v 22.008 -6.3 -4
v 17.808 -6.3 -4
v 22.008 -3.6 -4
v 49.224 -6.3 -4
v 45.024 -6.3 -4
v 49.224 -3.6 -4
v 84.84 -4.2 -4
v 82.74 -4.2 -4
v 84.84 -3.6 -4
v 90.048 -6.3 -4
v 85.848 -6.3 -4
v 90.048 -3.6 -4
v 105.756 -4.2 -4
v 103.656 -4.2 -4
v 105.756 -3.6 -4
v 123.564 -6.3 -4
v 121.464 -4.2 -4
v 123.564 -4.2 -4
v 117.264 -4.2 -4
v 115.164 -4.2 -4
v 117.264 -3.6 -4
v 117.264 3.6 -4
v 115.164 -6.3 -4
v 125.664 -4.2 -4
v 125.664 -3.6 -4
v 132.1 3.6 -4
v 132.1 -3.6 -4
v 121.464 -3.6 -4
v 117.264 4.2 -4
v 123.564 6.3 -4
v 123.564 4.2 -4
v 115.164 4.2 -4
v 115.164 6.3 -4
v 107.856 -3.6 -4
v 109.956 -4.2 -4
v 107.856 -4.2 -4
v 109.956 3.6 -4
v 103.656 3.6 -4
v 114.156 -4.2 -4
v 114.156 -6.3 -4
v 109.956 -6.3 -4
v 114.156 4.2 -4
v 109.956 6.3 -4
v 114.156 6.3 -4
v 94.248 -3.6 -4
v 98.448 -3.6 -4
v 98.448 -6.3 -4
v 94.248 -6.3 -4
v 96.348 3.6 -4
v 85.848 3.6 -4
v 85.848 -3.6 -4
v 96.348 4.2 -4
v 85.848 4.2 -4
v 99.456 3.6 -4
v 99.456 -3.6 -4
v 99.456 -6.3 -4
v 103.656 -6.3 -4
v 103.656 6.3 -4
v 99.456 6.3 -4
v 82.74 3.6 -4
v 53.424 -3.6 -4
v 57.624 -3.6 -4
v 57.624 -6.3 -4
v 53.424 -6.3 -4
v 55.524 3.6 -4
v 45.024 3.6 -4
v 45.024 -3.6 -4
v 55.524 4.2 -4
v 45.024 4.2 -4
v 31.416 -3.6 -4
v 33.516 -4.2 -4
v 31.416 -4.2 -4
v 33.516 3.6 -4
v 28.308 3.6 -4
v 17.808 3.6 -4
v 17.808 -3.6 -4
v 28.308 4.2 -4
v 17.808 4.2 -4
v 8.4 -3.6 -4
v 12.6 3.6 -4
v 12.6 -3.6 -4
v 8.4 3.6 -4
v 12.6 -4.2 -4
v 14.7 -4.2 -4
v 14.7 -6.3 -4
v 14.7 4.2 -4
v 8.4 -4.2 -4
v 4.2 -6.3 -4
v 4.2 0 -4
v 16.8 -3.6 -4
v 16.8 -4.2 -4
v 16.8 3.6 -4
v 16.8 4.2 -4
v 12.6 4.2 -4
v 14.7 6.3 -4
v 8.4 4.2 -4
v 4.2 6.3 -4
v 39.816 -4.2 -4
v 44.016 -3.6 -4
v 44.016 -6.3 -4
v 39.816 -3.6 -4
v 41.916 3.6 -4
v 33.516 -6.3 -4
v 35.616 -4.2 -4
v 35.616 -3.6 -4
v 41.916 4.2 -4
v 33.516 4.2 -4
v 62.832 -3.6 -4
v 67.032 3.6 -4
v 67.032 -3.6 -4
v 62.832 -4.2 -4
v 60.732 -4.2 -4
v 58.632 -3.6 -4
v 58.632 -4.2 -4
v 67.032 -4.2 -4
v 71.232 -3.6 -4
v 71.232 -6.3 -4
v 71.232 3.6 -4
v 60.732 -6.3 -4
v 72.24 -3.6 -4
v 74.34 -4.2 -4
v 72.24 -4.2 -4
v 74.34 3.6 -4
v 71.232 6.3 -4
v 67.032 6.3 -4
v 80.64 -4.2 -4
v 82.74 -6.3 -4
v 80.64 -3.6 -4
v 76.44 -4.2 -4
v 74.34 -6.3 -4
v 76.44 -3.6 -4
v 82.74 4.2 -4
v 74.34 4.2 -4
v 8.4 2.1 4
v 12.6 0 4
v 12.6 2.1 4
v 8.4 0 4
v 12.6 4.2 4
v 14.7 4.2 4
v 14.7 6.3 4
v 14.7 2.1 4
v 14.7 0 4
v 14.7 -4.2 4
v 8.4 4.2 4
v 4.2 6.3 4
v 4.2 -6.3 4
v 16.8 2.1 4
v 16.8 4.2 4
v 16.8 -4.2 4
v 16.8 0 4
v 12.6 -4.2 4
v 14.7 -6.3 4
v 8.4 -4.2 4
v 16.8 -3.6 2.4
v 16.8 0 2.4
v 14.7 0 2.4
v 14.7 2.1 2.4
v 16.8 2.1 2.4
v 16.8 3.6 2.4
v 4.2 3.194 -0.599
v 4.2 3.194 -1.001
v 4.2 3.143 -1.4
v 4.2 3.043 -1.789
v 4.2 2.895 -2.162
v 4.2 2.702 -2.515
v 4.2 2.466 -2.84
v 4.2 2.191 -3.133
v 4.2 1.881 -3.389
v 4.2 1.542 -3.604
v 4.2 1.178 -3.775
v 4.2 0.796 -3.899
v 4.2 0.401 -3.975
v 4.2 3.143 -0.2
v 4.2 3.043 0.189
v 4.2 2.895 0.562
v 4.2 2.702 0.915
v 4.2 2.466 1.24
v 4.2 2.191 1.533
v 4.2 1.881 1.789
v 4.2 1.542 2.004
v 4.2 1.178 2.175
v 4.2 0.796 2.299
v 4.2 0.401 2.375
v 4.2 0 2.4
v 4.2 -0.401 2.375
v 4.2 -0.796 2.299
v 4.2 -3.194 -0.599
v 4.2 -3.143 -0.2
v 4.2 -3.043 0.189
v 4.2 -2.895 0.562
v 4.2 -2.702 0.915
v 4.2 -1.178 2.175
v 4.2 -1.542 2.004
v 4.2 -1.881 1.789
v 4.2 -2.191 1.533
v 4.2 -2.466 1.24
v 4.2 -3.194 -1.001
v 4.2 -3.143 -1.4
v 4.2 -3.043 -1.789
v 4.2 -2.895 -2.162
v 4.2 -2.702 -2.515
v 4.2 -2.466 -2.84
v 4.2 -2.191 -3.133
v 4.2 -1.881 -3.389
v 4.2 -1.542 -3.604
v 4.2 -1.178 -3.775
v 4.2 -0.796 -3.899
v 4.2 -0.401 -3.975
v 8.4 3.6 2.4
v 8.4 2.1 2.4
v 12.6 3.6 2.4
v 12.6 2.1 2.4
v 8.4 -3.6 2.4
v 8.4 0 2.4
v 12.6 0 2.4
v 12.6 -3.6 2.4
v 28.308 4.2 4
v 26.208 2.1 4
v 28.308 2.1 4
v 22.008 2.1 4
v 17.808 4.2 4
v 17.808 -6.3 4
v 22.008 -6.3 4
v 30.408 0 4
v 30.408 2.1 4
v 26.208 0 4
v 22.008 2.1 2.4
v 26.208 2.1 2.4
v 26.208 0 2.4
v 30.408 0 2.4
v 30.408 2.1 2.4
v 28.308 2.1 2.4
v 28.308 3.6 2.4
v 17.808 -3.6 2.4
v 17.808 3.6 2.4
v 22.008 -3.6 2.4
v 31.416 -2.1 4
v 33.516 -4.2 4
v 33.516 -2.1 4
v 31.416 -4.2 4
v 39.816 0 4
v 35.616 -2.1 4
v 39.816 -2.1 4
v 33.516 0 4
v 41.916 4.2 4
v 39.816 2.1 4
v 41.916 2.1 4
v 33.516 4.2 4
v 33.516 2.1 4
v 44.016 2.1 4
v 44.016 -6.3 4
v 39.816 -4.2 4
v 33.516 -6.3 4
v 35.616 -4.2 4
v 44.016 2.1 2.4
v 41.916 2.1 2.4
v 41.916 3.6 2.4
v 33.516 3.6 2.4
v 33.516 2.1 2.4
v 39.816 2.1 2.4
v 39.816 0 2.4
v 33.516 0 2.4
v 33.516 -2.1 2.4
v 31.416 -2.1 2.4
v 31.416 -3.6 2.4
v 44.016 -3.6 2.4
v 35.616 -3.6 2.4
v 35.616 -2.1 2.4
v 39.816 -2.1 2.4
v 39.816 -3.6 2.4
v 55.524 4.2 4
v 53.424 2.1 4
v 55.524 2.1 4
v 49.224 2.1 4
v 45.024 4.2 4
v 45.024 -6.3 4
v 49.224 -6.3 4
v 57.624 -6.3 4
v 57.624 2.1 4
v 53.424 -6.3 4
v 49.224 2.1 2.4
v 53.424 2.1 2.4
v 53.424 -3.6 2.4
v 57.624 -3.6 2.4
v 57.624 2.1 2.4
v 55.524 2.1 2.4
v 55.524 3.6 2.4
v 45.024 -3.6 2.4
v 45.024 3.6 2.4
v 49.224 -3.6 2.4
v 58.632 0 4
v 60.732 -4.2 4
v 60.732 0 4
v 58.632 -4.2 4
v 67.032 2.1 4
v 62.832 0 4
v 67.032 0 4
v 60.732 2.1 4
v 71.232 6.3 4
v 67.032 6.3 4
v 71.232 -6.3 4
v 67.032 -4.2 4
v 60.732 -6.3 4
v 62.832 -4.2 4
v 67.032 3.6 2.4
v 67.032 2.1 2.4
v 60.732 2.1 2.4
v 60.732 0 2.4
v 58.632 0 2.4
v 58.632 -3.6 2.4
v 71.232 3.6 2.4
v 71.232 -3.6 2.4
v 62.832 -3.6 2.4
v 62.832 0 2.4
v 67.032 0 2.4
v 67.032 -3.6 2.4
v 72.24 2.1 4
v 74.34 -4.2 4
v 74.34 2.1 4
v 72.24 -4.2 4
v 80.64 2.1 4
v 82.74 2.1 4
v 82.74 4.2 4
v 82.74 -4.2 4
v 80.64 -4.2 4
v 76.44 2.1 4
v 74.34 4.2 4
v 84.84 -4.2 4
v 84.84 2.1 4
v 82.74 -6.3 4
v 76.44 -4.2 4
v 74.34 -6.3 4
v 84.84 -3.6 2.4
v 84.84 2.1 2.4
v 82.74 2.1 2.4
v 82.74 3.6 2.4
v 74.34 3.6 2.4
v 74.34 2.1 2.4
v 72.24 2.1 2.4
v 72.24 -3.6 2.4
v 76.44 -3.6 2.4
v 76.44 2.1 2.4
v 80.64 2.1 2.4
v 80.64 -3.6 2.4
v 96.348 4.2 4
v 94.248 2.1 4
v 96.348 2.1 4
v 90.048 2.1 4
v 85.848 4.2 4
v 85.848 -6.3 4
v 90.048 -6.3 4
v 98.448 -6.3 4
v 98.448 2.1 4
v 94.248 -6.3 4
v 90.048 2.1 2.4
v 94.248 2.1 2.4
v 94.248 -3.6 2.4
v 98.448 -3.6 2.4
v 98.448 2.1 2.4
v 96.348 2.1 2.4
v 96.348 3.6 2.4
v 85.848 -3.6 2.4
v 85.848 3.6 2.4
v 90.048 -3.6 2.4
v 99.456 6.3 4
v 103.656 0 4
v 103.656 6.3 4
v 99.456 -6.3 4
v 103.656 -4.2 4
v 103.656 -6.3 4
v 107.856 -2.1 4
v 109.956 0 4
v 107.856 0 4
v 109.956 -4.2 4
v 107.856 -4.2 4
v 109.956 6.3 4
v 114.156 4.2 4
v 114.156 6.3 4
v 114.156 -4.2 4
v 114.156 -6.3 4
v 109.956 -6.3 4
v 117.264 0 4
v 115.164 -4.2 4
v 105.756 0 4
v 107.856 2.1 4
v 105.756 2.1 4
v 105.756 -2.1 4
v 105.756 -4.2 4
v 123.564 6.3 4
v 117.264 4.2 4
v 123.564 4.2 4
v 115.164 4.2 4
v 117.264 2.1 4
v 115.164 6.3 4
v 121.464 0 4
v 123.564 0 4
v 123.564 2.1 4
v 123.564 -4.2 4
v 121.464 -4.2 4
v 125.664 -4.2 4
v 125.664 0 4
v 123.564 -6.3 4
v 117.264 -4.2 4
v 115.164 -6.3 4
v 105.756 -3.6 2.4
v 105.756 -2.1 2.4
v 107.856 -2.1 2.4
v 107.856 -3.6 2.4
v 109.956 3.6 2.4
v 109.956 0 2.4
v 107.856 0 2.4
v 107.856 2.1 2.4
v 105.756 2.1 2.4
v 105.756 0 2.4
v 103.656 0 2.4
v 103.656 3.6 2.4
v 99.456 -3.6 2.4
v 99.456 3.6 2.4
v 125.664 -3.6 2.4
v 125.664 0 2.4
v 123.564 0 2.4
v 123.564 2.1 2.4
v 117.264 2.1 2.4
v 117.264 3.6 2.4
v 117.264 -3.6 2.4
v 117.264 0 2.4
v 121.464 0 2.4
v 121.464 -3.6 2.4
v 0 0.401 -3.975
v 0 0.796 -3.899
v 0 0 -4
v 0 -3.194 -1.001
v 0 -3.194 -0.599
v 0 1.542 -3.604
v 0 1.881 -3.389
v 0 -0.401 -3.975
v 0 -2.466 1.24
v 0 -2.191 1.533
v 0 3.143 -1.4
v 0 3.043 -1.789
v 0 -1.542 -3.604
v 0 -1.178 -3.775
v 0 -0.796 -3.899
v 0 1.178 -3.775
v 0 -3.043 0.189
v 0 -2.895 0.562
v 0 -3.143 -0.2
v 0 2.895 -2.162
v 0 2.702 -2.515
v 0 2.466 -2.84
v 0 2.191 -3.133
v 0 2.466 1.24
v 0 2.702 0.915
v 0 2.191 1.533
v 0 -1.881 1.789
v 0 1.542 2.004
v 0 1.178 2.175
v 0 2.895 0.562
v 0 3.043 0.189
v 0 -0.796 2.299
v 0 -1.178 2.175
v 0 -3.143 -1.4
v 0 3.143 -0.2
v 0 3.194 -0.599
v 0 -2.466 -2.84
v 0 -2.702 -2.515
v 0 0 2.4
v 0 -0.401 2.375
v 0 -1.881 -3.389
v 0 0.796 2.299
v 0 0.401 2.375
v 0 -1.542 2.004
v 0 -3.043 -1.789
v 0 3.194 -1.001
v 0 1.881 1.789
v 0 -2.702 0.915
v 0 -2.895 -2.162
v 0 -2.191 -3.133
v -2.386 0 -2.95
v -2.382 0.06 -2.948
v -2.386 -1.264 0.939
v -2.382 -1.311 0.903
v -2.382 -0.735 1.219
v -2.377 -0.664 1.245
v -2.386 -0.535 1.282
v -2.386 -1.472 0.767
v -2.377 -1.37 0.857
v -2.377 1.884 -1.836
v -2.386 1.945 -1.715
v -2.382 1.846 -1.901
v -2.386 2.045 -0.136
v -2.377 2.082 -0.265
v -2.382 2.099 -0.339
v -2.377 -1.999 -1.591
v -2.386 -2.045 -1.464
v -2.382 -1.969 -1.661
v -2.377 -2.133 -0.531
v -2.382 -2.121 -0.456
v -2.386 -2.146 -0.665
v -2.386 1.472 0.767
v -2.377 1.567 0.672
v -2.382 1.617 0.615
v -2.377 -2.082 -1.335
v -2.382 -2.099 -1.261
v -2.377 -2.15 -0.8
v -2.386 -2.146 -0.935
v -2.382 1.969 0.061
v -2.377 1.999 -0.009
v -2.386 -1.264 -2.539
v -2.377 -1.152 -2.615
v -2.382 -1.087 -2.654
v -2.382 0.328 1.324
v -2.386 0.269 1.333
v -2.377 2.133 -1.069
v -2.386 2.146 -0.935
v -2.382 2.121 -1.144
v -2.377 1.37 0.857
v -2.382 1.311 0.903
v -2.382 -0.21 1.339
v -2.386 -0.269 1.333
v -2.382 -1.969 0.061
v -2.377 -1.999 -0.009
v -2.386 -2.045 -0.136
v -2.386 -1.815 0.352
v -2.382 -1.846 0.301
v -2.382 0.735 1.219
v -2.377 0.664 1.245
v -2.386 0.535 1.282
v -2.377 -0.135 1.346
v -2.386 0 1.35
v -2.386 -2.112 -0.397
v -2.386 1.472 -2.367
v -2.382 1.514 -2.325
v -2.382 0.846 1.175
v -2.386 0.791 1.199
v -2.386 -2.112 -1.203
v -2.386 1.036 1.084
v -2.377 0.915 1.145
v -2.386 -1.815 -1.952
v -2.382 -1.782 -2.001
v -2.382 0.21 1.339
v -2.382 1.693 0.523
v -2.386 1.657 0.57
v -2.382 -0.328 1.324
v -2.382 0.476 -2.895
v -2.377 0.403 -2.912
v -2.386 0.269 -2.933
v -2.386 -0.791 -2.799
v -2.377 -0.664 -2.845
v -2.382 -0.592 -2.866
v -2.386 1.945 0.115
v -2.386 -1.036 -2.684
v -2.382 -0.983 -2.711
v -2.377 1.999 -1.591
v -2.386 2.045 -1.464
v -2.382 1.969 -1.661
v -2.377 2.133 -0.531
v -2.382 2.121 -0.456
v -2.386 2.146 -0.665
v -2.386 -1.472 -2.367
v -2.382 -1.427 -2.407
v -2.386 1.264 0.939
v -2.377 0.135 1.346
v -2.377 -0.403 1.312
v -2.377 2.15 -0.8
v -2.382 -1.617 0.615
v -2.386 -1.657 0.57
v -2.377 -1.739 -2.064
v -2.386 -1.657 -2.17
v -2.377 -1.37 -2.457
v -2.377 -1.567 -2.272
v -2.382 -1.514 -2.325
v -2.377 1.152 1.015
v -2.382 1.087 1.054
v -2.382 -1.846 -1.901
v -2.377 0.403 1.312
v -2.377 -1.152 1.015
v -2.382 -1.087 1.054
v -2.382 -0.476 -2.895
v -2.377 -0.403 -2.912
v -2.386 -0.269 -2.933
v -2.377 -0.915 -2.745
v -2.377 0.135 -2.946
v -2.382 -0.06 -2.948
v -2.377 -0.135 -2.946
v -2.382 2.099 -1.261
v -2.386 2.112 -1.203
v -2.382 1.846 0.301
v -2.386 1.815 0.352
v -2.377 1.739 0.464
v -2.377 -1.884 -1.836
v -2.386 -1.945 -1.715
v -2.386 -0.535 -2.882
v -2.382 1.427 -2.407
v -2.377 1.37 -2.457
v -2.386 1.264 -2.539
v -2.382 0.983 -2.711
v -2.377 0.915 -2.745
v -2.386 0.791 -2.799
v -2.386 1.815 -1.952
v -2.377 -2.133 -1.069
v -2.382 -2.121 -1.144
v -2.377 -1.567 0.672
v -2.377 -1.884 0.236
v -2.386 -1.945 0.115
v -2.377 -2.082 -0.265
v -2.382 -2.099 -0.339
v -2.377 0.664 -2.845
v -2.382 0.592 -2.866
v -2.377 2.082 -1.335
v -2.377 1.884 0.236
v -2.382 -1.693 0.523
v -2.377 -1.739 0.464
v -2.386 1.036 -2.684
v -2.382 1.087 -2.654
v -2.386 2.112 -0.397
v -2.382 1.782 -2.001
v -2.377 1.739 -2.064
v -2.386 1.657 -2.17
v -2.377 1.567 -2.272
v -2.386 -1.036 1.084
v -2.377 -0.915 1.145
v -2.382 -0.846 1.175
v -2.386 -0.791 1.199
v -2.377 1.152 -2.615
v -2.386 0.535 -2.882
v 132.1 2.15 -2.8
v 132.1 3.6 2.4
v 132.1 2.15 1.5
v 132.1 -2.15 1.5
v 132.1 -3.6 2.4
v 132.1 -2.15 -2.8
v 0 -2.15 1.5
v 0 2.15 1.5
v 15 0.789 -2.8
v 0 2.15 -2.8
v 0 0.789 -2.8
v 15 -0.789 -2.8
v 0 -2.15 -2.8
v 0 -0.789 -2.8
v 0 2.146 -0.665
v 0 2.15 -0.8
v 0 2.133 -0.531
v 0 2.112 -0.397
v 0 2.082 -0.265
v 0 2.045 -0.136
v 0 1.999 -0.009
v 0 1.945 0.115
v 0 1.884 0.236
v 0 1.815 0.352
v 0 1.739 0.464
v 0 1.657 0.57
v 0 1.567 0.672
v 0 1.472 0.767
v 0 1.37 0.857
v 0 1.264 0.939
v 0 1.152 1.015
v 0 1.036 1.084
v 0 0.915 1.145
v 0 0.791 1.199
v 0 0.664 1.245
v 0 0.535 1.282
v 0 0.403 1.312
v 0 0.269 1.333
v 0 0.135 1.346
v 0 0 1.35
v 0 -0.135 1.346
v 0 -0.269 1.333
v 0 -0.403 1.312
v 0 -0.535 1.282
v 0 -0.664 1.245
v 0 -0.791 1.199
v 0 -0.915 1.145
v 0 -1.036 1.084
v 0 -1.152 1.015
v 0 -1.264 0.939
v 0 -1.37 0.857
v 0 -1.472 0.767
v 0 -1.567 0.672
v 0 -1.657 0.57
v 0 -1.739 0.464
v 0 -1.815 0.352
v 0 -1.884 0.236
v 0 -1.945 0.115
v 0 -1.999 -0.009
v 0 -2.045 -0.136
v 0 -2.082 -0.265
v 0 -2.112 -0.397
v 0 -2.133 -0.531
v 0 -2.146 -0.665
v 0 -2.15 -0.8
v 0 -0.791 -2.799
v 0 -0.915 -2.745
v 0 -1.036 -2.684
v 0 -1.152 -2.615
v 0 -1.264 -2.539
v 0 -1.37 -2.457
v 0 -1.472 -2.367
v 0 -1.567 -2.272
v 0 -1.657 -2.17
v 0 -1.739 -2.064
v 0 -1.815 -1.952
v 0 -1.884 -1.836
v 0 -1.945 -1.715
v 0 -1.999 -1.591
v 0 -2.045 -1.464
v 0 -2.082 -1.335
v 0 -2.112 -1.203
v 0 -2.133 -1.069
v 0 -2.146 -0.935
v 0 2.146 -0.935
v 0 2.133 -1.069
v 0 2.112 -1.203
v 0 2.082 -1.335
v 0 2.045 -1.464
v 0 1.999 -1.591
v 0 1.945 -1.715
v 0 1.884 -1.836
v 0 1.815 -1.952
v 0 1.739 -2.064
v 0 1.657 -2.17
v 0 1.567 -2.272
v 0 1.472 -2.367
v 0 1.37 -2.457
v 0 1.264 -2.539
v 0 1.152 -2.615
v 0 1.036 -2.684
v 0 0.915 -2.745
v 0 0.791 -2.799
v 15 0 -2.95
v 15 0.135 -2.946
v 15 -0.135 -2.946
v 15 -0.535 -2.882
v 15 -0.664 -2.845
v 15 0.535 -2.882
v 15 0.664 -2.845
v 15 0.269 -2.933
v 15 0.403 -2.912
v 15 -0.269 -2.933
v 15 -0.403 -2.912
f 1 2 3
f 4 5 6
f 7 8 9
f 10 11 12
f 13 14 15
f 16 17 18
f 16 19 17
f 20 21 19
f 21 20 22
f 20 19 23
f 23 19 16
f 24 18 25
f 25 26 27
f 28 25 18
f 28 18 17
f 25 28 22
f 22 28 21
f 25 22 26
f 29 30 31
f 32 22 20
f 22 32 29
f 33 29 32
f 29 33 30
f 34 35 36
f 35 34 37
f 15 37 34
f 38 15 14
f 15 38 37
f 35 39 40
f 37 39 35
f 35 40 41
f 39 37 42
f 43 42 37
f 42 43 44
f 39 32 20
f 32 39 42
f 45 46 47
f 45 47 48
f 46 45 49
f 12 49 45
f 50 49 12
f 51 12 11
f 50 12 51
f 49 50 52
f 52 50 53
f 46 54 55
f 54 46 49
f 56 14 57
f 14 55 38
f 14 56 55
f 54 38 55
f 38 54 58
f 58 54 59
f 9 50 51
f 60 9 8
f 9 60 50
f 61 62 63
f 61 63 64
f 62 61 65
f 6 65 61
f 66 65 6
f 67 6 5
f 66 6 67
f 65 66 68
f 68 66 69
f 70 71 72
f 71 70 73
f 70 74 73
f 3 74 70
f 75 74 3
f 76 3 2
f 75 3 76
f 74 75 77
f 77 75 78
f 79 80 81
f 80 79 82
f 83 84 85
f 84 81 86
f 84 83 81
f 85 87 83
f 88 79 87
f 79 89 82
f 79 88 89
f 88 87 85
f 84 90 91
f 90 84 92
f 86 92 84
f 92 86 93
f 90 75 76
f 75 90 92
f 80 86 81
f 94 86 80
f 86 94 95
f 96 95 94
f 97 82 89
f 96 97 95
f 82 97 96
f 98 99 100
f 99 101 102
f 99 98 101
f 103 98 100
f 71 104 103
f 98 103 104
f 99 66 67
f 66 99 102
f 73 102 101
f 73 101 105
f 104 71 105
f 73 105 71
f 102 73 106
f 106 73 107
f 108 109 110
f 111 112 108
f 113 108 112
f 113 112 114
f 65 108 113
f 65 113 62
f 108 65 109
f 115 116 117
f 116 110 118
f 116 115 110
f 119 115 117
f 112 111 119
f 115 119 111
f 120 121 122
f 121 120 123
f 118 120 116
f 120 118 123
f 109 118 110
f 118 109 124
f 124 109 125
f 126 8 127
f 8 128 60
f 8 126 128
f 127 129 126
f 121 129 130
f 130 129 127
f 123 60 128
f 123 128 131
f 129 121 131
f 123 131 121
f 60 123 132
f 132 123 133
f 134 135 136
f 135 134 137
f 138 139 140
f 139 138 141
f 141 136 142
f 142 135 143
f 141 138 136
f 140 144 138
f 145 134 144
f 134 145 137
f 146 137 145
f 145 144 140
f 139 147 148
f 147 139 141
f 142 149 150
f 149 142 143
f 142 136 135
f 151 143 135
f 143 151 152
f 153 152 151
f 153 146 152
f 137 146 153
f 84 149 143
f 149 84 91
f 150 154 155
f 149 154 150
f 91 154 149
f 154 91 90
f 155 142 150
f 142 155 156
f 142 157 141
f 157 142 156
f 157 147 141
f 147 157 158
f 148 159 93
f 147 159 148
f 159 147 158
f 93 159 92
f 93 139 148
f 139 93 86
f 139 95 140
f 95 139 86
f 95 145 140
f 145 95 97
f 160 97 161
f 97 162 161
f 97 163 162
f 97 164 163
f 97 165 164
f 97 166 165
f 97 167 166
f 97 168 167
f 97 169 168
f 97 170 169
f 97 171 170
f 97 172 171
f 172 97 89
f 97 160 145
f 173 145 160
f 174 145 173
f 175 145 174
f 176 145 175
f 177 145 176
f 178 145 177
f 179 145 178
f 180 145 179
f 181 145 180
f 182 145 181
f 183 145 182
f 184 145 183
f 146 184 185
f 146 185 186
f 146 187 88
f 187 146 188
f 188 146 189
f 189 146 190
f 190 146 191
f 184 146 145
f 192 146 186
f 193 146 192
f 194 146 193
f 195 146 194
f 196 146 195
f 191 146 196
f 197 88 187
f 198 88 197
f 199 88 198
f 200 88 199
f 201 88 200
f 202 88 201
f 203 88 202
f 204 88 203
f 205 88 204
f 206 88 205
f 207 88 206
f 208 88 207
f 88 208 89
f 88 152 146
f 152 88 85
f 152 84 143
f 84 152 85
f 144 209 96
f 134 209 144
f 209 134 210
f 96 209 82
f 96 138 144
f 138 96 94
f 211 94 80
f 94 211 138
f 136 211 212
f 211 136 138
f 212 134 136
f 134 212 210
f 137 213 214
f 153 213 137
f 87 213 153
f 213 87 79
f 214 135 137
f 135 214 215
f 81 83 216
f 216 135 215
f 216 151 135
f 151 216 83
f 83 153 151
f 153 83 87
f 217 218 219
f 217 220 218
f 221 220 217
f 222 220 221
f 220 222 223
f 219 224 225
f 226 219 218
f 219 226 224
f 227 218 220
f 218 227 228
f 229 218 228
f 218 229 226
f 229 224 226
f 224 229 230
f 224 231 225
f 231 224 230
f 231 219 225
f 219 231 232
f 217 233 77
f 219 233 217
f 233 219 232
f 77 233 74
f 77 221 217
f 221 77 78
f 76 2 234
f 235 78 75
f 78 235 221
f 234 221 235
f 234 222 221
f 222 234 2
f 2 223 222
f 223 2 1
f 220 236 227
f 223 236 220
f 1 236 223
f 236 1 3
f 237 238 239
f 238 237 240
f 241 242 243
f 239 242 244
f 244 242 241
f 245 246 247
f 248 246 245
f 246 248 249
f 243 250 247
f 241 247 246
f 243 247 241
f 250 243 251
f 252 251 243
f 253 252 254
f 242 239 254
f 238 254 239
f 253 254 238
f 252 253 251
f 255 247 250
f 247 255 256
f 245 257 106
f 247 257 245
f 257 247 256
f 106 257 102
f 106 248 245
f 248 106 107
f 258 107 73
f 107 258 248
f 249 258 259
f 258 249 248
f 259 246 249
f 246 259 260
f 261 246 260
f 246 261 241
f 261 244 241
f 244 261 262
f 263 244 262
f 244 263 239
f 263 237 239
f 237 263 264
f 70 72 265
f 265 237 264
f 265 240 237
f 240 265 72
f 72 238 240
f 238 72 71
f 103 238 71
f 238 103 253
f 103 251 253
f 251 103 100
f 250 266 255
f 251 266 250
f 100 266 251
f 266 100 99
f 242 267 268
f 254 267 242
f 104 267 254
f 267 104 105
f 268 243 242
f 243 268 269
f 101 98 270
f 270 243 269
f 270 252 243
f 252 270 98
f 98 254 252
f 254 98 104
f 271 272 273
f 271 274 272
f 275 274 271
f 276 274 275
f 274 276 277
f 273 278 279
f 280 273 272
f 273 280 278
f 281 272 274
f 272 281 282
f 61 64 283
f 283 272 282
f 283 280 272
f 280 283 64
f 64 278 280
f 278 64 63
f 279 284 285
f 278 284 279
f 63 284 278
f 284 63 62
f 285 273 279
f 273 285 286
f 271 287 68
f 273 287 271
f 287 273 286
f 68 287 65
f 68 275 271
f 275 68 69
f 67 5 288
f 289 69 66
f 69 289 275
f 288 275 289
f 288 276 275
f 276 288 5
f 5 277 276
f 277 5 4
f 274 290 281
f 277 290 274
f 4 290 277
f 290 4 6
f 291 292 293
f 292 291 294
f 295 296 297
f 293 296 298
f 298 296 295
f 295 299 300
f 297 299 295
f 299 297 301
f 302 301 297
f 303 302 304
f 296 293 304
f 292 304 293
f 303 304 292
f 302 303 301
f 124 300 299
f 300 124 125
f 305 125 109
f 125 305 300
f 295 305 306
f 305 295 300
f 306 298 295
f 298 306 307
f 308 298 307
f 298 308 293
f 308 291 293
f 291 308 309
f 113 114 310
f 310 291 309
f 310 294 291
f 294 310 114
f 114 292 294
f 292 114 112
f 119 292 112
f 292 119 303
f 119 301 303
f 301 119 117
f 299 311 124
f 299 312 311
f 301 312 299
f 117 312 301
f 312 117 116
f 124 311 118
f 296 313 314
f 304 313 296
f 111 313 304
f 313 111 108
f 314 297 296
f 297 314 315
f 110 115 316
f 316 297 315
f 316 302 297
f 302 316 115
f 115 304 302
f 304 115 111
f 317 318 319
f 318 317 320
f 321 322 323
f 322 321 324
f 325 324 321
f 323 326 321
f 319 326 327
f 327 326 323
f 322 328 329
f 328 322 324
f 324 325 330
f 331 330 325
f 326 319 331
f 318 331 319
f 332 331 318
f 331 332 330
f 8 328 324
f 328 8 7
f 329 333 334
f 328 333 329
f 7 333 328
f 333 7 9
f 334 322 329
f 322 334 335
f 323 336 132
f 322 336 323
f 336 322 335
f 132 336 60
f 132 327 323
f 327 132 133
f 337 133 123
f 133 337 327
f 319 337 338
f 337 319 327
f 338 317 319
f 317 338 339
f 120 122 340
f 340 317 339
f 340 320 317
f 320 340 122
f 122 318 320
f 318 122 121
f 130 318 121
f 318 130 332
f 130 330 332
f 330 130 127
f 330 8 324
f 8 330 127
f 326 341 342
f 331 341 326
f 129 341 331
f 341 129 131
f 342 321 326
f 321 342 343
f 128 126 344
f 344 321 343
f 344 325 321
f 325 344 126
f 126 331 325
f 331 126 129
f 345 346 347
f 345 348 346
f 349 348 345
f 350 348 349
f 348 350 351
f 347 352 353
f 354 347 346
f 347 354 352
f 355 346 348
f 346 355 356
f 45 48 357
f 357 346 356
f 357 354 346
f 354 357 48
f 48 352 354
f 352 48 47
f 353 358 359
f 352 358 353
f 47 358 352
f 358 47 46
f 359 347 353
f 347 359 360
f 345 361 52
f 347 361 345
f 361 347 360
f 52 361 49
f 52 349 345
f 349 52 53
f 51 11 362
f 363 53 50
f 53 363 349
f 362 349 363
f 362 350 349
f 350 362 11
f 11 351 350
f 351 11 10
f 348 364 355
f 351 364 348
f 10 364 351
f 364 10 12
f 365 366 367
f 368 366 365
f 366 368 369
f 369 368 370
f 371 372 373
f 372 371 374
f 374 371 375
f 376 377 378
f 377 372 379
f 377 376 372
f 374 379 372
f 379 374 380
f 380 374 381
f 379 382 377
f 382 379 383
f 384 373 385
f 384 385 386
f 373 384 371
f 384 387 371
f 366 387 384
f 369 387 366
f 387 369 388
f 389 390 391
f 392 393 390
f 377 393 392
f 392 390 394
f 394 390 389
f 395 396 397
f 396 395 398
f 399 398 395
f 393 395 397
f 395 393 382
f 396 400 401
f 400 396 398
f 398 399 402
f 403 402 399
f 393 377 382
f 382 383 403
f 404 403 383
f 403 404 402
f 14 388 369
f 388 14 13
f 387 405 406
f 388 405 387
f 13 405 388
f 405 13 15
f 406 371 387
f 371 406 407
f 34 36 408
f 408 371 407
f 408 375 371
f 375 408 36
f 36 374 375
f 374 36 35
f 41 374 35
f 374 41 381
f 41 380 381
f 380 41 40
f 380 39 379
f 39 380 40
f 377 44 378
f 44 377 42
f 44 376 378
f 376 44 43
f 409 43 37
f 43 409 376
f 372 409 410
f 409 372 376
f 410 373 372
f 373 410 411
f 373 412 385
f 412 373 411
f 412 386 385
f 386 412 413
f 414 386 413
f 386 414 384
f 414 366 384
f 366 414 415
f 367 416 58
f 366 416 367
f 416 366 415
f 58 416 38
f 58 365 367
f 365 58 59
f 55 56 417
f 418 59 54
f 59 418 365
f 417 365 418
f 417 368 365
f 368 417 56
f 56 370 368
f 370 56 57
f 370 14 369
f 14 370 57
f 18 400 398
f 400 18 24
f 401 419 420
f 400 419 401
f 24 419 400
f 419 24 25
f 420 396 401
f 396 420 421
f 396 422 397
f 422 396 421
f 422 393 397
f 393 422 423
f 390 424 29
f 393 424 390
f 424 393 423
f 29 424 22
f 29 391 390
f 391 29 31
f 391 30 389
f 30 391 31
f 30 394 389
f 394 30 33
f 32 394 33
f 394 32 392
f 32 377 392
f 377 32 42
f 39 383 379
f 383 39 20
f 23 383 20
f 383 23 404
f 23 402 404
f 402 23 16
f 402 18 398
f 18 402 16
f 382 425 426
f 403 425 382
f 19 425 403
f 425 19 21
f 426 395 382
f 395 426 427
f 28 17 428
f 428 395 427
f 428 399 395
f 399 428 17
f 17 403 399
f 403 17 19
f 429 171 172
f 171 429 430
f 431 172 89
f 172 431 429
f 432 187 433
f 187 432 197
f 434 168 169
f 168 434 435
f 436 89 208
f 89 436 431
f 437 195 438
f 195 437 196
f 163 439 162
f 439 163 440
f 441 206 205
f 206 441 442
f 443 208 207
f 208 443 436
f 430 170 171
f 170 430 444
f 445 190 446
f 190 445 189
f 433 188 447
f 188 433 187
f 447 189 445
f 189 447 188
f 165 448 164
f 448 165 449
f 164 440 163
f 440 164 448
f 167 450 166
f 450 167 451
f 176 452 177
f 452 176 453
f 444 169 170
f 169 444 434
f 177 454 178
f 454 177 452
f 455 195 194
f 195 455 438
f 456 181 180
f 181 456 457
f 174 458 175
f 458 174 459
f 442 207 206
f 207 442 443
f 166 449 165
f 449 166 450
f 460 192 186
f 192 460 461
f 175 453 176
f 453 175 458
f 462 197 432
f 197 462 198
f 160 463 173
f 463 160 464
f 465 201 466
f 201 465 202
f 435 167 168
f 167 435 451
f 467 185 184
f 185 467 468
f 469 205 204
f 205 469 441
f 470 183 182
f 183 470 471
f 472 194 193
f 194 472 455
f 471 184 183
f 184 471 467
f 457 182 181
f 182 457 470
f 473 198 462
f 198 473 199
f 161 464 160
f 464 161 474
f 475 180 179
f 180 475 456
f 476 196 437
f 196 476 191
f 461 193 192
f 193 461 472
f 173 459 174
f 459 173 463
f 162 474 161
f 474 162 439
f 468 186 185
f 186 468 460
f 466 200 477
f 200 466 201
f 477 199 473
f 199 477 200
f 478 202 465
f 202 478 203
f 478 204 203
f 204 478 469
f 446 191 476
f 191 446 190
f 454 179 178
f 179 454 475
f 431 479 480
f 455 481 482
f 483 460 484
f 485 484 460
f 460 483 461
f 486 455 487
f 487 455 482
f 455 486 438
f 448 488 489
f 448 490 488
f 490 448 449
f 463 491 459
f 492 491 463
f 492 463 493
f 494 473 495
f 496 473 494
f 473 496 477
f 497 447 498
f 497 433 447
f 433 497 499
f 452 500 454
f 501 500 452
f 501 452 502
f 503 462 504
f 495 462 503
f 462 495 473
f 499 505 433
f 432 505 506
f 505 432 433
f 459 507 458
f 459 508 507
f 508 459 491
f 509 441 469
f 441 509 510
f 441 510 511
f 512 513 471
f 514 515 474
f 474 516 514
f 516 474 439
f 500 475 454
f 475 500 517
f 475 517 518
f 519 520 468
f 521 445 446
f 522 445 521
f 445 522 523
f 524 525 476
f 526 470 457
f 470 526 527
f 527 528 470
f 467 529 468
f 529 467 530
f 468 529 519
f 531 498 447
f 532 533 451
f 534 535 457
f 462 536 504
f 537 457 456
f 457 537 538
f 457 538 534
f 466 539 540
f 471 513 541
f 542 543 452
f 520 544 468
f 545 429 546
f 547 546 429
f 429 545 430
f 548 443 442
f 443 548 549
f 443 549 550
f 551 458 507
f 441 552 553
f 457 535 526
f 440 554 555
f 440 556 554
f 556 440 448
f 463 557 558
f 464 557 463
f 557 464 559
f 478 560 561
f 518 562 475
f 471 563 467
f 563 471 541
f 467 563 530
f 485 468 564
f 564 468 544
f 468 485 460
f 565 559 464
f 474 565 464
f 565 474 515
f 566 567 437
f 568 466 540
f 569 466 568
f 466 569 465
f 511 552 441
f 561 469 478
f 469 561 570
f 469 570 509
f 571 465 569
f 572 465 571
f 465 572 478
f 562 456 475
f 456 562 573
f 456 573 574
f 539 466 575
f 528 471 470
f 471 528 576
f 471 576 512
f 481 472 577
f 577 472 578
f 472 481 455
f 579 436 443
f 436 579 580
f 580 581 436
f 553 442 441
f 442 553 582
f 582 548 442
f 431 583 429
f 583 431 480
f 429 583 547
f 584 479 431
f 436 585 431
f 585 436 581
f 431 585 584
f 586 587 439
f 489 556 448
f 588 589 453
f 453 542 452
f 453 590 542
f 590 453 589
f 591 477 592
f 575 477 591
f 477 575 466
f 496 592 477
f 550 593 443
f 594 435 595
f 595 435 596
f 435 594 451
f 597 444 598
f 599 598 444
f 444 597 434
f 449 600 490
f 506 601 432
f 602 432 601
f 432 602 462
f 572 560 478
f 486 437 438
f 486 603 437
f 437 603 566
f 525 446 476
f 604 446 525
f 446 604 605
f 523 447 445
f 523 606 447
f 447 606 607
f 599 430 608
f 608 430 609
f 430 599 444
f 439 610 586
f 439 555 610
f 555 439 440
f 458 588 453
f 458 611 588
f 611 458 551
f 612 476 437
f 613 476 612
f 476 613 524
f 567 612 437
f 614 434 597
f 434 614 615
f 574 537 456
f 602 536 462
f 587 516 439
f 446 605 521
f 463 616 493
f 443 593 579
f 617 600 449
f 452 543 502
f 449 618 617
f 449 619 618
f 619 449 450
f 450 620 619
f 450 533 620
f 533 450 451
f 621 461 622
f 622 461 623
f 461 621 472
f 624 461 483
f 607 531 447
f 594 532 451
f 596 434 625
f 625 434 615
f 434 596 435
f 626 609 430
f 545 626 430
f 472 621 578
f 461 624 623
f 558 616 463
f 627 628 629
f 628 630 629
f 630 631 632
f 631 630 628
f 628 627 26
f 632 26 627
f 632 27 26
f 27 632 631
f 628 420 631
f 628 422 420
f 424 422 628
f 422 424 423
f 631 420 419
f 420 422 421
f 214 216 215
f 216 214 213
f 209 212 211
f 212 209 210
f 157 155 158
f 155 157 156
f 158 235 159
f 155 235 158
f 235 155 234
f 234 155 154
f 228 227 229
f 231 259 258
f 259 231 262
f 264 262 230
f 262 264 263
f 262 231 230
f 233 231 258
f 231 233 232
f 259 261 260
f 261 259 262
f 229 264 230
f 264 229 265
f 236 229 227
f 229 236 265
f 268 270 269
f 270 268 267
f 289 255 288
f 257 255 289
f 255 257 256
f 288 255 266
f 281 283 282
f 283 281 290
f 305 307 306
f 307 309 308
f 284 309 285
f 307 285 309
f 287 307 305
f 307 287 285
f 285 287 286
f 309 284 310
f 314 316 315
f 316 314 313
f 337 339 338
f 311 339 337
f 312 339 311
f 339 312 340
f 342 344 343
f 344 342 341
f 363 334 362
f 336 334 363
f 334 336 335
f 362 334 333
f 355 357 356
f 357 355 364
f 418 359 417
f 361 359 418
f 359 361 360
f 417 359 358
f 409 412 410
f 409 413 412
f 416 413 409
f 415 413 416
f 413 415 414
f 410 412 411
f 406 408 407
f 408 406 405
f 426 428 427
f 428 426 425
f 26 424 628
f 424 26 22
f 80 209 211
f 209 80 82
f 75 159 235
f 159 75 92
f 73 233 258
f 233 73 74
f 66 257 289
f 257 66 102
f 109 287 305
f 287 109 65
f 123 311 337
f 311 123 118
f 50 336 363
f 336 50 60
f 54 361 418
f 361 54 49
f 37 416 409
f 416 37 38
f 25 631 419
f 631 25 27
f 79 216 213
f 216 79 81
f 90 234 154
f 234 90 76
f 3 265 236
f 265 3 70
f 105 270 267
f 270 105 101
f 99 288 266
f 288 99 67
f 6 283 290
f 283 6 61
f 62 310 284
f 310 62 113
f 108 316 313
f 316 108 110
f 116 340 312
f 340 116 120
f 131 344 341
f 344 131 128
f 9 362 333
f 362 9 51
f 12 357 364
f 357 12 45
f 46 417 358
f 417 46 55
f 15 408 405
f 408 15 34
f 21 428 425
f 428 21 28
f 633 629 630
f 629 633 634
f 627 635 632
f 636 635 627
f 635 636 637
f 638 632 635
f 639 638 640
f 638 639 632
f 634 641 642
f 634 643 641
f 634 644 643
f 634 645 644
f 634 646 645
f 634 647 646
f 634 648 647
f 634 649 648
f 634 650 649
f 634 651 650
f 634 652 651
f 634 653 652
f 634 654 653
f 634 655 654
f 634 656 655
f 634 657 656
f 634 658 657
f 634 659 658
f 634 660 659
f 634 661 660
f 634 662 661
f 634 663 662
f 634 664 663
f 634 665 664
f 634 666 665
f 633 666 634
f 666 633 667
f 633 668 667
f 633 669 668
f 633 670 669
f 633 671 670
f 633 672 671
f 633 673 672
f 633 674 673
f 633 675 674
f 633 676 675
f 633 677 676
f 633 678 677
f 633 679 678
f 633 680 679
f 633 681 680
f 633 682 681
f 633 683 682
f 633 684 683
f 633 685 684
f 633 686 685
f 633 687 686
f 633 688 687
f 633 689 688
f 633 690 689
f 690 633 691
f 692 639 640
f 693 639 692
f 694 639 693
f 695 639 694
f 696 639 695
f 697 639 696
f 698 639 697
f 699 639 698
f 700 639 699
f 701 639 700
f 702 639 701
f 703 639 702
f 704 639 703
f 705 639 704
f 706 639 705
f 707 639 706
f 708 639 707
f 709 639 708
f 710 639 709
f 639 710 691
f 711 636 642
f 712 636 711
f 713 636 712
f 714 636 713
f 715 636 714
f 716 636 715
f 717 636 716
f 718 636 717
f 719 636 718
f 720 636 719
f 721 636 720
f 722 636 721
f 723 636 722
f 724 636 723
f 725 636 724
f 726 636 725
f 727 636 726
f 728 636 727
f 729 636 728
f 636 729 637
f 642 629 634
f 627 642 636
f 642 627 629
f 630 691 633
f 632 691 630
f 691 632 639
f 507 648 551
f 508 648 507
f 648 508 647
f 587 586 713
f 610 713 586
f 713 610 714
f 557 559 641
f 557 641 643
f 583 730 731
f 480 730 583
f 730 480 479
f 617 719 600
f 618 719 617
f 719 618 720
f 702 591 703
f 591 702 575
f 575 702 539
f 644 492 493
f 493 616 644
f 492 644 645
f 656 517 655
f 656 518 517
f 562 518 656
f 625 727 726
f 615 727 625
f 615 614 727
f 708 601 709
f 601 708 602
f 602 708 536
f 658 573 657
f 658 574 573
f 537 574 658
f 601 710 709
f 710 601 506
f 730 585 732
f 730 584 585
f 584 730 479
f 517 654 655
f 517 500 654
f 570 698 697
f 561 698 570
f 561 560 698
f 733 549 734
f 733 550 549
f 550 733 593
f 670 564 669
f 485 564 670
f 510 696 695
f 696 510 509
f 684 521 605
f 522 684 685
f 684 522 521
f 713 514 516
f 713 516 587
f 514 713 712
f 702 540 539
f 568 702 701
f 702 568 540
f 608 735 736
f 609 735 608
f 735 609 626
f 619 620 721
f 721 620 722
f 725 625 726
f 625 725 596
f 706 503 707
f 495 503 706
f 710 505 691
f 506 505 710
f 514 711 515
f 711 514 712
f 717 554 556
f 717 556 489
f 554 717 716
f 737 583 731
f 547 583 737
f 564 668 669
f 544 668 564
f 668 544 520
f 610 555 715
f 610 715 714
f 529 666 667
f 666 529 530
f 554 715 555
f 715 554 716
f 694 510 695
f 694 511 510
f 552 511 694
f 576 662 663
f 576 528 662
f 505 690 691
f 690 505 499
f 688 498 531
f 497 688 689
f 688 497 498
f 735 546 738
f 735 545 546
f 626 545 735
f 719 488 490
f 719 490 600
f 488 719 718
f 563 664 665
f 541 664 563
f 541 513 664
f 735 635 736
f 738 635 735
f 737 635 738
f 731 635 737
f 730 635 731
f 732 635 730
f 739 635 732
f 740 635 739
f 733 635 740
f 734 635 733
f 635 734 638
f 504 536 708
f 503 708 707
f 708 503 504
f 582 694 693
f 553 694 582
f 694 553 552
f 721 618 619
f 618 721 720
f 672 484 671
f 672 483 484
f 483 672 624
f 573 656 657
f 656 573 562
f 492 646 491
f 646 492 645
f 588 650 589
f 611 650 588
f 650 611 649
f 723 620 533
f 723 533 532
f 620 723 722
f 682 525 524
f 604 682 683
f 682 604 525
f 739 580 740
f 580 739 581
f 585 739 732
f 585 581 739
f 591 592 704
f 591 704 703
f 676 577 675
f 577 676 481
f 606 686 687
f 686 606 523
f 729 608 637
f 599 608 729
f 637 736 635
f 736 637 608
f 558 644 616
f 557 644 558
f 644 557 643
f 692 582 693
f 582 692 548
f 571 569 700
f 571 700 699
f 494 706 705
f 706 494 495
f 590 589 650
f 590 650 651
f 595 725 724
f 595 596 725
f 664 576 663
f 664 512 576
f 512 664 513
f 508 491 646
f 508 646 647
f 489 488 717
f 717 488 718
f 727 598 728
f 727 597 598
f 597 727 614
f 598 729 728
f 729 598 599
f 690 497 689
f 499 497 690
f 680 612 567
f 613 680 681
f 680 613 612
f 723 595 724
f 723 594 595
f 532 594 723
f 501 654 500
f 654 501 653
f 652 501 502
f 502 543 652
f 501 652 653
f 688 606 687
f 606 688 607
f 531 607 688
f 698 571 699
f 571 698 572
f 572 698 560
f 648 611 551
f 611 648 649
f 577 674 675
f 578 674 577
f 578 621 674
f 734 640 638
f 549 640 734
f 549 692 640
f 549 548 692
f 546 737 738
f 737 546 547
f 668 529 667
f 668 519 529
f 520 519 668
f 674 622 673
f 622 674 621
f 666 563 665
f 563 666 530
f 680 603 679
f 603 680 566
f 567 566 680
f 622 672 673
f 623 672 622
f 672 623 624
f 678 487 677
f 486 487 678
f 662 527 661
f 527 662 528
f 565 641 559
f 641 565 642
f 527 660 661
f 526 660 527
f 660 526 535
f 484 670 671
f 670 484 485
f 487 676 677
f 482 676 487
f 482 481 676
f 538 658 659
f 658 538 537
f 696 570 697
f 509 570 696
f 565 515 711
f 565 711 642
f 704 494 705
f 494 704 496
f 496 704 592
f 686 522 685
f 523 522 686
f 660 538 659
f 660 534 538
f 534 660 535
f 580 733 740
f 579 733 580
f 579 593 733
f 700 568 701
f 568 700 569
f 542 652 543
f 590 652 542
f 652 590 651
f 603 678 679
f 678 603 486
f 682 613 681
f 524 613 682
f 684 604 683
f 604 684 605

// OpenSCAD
use <MCAD/fonts.scad>

// Word to display on the pen
word = "BrandonW6";

// Scale multipler for font size
font_scale = 2.1	;

// Character Spacing (for some reason this value is buggy using the customizer)
font_spacing = 0.81; 

// The diameter of end hole
pen_inner_diameter = 4.3 *1;
pen_inner_radius = pen_inner_diameter / 2;

// length of the entire pen
pen_length = 130; //

// Overal thickness of the pen
pen_thickness = 8*1;


/////////////////////////////////////////
//////////////////////////////////



module penword()
{

thisFont=8bit_polyfont();
x_shift=thisFont[0][0] * font_spacing;
y_shift=thisFont[0][1];

	theseIndicies=search(word,thisFont[2],1,1);
	wordlength = (len(theseIndicies))* x_shift;
	
	difference() {

		union() {

// Create the Text //
			scale([font_scale,font_scale,1]){
			for( j=[0:(len(theseIndicies)-1)] ) 
				translate([ j*x_shift + 1, -y_shift/2 ,-pen_thickness/2]) 
				{
					linear_extrude(height=pen_thickness) polygon(points=thisFont[2][theseIndicies[j]][6][0],paths=thisFont[2][theseIndicies[j]][6][1]);
				}
			}
			
// Main body
			translate([1*font_scale+3	,-y_shift*.45,-pen_thickness/2]) cube([pen_length - 3,y_shift * 0.9,pen_thickness * 0.8]);

// Pen Tip
			rotate(a=[0,90,0]) 
				{
					translate([pen_thickness*0.1,0,0	])	cylinder(h = 5, r = pen_thickness*.4, $fn=50);
					translate([pen_thickness*0.1,0,-5	])	cylinder(h = 5, r1 = 1, r2 = pen_thickness*.4, $fn=50);
				}			
		}
// Cut outs
			translate([0,-pen_inner_diameter/2,-pen_thickness/2+pen_thickness*.15]) cube([pen_length + 20,pen_inner_diameter,pen_inner_diameter]);
			rotate(a=[0,90,0])translate([pen_thickness*.1,0,-15])	cylinder(h = 30, r = pen_inner_radius, $fn=100);
	}
}




penword();
